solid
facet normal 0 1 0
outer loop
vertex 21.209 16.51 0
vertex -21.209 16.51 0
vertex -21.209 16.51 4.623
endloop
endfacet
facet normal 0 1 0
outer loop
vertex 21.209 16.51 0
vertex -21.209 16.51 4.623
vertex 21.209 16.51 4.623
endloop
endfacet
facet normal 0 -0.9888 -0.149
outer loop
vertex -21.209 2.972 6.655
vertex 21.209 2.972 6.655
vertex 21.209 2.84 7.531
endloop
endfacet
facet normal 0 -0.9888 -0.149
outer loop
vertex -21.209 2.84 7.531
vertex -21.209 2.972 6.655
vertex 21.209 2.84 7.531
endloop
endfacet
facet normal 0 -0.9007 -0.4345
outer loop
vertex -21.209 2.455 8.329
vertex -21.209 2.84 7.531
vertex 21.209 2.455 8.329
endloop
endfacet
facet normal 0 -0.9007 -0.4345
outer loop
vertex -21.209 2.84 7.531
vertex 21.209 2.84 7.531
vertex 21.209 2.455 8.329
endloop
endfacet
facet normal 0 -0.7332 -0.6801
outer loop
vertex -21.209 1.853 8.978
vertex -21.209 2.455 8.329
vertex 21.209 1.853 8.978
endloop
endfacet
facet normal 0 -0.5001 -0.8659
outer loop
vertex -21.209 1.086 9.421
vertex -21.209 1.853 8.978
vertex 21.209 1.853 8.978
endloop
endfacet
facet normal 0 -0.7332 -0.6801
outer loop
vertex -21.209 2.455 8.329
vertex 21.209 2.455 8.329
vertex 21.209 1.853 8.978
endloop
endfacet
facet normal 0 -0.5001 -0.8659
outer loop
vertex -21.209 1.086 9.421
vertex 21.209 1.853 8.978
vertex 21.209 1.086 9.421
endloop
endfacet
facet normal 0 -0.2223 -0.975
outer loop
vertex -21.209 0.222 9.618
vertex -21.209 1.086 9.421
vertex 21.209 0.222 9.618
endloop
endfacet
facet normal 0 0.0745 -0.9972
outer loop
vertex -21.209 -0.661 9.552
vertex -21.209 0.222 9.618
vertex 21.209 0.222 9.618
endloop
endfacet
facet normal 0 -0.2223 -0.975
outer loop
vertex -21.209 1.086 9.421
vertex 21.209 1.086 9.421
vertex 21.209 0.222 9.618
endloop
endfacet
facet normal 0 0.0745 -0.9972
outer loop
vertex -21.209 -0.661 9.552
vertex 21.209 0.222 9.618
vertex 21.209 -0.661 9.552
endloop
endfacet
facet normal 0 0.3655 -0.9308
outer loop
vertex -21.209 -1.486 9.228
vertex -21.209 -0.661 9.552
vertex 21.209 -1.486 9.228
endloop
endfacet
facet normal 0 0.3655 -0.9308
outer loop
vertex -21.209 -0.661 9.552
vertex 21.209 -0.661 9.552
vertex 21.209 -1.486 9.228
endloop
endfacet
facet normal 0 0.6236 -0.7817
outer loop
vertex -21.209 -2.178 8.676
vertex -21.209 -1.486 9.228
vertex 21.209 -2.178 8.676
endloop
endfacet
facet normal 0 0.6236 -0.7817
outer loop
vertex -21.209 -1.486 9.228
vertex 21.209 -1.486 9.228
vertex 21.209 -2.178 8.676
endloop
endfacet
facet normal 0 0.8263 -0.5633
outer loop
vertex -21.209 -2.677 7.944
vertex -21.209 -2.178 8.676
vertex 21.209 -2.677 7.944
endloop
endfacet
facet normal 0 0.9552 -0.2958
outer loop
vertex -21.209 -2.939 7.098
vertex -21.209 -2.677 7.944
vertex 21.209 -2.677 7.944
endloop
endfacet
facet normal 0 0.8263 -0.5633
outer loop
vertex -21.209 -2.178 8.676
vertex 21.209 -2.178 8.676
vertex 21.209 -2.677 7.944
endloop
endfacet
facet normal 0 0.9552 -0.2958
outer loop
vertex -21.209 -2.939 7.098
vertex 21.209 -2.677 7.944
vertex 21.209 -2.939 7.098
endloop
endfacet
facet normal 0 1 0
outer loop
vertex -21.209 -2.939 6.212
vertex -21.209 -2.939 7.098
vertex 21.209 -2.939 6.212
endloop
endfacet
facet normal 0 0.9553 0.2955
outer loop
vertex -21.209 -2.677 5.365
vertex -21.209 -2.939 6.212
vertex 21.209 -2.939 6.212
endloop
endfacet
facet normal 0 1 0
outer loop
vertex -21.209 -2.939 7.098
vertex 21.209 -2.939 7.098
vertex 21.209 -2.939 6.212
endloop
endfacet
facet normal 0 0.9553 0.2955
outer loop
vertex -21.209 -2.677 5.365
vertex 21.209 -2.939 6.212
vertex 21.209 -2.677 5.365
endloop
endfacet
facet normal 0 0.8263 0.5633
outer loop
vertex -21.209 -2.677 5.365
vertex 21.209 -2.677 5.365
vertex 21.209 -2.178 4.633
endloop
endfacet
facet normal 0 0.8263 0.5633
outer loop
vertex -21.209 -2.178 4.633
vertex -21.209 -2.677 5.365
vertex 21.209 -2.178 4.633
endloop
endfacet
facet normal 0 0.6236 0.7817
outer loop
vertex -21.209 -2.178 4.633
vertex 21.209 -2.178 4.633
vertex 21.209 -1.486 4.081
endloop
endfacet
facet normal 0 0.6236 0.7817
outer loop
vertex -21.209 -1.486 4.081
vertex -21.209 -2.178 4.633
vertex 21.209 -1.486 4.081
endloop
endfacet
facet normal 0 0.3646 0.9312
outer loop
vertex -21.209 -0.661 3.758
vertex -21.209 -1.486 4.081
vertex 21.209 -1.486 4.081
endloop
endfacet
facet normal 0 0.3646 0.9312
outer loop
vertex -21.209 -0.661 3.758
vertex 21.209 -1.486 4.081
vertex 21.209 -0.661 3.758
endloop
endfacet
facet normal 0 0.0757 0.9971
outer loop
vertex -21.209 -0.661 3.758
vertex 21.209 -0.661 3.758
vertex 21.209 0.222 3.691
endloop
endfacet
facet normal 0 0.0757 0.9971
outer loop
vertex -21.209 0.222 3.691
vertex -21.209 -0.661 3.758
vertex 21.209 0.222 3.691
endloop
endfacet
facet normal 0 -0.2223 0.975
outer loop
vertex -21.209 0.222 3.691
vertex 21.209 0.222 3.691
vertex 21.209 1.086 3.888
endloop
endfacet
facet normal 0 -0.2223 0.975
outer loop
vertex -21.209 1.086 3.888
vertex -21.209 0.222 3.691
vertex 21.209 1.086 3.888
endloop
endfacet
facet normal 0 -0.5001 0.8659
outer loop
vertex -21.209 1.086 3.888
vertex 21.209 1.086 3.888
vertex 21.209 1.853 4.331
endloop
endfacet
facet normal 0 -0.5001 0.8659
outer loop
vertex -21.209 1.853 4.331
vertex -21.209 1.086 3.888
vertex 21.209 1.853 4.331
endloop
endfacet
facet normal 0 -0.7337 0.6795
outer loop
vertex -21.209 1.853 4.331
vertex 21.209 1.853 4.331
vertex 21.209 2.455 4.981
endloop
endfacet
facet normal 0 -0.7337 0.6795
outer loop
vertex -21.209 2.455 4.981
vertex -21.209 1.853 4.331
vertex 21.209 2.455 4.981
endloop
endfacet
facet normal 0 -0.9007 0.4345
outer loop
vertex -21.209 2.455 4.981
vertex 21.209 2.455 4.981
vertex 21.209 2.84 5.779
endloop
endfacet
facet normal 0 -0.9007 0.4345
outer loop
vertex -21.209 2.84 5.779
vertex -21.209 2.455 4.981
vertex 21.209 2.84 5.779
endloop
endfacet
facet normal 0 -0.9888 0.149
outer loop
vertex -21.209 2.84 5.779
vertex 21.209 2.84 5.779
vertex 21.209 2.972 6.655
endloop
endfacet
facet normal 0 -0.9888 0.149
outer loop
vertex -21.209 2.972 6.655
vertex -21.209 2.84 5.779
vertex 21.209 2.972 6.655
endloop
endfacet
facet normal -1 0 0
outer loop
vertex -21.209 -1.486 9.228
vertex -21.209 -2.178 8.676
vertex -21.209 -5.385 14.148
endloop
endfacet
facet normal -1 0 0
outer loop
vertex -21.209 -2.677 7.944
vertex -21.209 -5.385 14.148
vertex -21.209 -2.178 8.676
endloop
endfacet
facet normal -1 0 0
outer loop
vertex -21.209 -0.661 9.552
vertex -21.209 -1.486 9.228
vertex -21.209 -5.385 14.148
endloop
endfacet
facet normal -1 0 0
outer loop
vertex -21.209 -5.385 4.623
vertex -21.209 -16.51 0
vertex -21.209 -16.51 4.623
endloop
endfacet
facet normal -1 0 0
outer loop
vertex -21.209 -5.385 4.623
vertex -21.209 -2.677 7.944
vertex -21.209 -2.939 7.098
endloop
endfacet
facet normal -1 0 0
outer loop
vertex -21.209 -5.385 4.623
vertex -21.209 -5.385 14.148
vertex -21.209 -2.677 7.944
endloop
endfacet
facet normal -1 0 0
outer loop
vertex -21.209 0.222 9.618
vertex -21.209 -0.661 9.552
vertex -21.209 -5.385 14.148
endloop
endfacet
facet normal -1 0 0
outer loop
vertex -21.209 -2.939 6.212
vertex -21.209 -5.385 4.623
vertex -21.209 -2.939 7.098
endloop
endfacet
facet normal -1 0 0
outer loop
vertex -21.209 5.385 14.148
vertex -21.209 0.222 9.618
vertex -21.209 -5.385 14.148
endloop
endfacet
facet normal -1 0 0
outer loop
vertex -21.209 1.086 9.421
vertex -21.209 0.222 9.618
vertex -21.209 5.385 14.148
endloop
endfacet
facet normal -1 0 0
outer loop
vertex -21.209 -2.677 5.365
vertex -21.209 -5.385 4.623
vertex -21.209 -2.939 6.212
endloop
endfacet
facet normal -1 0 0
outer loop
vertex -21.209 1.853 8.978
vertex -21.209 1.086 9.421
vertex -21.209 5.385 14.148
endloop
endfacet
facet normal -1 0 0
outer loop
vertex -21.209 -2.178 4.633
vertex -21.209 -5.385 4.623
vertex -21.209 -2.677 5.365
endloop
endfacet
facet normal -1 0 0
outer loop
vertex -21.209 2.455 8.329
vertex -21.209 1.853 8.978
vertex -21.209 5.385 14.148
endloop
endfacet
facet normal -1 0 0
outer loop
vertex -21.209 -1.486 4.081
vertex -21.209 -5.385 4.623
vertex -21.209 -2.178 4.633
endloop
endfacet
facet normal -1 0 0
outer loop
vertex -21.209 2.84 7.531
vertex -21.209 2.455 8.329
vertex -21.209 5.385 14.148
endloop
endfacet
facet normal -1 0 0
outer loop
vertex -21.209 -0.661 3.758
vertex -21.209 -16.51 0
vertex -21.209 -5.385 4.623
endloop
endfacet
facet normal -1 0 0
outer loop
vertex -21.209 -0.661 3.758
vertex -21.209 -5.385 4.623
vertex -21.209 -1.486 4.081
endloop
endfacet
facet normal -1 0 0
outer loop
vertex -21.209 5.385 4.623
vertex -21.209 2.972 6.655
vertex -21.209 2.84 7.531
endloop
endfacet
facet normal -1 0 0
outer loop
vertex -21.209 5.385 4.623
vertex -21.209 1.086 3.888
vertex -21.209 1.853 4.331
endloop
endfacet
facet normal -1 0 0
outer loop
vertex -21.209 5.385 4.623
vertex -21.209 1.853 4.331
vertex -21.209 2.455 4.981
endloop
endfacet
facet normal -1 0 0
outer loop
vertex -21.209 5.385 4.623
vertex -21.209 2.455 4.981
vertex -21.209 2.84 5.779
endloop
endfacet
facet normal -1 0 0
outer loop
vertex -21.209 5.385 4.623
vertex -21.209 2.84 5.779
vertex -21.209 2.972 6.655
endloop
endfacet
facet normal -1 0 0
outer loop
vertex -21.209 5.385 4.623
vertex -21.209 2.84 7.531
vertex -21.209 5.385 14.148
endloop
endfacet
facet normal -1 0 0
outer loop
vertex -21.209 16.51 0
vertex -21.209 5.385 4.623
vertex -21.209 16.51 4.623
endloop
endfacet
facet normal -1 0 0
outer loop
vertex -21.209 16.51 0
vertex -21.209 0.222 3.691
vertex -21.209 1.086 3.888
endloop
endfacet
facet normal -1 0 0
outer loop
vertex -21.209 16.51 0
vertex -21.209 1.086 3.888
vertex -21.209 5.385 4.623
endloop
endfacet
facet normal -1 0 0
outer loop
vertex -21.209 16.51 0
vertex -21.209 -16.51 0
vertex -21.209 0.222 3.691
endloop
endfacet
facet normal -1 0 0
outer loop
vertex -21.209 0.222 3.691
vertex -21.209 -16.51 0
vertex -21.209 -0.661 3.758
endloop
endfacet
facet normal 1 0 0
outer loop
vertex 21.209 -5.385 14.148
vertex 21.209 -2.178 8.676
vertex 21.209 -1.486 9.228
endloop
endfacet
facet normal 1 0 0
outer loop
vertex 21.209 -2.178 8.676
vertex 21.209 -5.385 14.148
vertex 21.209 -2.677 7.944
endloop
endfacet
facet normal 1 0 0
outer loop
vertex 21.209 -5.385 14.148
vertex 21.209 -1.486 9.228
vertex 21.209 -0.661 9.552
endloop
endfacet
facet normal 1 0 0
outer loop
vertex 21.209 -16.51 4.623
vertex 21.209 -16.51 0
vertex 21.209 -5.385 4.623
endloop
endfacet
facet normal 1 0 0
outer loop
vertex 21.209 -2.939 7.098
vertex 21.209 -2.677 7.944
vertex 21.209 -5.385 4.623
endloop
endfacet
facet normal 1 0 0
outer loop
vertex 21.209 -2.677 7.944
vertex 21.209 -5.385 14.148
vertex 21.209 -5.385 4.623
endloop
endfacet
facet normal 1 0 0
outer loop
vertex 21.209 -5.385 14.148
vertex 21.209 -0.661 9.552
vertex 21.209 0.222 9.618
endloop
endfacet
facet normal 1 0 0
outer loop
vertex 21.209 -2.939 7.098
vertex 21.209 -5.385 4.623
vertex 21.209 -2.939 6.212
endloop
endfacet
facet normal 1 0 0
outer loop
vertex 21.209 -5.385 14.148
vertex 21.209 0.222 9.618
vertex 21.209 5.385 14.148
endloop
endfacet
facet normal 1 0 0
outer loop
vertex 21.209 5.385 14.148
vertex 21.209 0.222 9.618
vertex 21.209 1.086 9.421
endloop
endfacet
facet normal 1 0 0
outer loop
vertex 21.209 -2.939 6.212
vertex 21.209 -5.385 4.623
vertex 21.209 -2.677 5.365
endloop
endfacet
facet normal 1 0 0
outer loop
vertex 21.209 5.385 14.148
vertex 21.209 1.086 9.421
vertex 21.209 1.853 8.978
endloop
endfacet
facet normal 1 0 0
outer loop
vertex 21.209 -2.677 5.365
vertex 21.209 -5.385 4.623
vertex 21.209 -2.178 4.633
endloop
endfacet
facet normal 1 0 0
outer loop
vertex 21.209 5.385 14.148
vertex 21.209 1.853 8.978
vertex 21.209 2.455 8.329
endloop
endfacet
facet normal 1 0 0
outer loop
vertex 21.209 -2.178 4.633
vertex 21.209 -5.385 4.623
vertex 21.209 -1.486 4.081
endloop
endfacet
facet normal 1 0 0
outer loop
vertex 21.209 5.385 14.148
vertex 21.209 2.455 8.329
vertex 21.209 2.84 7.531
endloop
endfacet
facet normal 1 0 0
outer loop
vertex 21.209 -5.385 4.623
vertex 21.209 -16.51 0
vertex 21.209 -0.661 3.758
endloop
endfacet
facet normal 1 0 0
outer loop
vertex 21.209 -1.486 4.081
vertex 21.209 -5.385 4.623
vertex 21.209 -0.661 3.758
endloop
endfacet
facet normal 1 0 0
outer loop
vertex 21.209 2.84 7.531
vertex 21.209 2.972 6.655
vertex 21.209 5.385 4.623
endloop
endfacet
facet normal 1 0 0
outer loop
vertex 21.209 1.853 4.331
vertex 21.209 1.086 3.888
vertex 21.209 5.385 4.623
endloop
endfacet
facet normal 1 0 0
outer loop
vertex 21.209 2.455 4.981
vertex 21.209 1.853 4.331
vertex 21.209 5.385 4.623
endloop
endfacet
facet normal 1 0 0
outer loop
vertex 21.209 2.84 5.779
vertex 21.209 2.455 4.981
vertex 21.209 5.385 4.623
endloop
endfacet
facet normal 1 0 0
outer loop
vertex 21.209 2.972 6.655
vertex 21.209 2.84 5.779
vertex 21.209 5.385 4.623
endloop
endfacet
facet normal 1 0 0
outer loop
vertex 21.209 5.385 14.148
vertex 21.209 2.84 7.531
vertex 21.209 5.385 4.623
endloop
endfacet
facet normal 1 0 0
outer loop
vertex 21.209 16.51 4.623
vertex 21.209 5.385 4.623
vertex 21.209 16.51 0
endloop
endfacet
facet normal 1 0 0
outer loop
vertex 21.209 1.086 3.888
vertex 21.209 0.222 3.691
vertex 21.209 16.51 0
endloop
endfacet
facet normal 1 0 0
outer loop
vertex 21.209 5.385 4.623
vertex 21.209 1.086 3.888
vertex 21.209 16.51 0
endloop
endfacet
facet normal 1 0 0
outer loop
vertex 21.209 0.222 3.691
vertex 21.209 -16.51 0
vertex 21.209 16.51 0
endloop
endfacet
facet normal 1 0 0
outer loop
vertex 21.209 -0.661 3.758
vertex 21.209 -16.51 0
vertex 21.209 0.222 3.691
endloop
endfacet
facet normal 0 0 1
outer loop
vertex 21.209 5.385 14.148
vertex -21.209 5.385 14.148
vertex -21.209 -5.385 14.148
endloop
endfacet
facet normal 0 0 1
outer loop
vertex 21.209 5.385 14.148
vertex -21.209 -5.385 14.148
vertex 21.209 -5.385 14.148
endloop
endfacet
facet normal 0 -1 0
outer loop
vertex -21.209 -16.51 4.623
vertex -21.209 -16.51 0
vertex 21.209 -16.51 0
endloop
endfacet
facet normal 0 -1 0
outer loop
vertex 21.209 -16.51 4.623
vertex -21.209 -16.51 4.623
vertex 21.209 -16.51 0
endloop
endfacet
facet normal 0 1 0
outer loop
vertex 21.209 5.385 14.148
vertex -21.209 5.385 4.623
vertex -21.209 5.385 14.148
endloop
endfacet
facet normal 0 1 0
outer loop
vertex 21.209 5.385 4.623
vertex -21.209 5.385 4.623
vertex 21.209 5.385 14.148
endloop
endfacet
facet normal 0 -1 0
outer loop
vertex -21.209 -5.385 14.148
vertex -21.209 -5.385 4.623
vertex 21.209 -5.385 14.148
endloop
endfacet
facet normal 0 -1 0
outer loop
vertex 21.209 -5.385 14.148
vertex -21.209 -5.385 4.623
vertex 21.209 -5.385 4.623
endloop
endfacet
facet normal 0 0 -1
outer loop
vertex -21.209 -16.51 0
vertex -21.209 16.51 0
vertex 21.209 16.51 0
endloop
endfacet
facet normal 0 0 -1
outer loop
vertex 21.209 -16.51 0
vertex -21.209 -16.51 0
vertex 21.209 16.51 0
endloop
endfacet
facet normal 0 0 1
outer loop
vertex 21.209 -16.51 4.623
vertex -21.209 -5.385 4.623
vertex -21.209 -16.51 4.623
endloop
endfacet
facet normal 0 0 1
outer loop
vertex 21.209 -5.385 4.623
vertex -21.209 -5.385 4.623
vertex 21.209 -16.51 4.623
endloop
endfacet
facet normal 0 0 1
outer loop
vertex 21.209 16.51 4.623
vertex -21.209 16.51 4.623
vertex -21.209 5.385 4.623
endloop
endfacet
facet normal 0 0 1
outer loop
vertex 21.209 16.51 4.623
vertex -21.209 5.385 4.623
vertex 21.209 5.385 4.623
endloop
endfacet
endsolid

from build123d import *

# Parameters (mm, degrees)
F0_W     = 42.418
F0_H     = 33.02
F1_DEPTH = 4.6228
F2_W     = 42.418
F2_H     = 10.7696
F3_DEPTH = 9.525
F4_R     = 2.9718
F5_DEPTH = 50.8


with BuildPart() as f1:
    # F0 (on Top) → F1 (new body)
    with BuildSketch(Plane.XY):
        Rectangle(F0_W, F0_H)
    extrude(amount=F1_DEPTH)

    # F2 (on face) → F3 (join)
    with BuildSketch(Plane.XY.offset(4.6228)):
        Rectangle(F2_W, F2_H)
    extrude(amount=F3_DEPTH)

    # F4 (on face) → F5 (cut)
    with BuildSketch(Plane.YZ.offset(21.209)):
        with Locations((0, 6.6548)):
            Circle(F4_R)
    extrude(amount=-F5_DEPTH, mode=Mode.SUBTRACT)


solid = f1.part
